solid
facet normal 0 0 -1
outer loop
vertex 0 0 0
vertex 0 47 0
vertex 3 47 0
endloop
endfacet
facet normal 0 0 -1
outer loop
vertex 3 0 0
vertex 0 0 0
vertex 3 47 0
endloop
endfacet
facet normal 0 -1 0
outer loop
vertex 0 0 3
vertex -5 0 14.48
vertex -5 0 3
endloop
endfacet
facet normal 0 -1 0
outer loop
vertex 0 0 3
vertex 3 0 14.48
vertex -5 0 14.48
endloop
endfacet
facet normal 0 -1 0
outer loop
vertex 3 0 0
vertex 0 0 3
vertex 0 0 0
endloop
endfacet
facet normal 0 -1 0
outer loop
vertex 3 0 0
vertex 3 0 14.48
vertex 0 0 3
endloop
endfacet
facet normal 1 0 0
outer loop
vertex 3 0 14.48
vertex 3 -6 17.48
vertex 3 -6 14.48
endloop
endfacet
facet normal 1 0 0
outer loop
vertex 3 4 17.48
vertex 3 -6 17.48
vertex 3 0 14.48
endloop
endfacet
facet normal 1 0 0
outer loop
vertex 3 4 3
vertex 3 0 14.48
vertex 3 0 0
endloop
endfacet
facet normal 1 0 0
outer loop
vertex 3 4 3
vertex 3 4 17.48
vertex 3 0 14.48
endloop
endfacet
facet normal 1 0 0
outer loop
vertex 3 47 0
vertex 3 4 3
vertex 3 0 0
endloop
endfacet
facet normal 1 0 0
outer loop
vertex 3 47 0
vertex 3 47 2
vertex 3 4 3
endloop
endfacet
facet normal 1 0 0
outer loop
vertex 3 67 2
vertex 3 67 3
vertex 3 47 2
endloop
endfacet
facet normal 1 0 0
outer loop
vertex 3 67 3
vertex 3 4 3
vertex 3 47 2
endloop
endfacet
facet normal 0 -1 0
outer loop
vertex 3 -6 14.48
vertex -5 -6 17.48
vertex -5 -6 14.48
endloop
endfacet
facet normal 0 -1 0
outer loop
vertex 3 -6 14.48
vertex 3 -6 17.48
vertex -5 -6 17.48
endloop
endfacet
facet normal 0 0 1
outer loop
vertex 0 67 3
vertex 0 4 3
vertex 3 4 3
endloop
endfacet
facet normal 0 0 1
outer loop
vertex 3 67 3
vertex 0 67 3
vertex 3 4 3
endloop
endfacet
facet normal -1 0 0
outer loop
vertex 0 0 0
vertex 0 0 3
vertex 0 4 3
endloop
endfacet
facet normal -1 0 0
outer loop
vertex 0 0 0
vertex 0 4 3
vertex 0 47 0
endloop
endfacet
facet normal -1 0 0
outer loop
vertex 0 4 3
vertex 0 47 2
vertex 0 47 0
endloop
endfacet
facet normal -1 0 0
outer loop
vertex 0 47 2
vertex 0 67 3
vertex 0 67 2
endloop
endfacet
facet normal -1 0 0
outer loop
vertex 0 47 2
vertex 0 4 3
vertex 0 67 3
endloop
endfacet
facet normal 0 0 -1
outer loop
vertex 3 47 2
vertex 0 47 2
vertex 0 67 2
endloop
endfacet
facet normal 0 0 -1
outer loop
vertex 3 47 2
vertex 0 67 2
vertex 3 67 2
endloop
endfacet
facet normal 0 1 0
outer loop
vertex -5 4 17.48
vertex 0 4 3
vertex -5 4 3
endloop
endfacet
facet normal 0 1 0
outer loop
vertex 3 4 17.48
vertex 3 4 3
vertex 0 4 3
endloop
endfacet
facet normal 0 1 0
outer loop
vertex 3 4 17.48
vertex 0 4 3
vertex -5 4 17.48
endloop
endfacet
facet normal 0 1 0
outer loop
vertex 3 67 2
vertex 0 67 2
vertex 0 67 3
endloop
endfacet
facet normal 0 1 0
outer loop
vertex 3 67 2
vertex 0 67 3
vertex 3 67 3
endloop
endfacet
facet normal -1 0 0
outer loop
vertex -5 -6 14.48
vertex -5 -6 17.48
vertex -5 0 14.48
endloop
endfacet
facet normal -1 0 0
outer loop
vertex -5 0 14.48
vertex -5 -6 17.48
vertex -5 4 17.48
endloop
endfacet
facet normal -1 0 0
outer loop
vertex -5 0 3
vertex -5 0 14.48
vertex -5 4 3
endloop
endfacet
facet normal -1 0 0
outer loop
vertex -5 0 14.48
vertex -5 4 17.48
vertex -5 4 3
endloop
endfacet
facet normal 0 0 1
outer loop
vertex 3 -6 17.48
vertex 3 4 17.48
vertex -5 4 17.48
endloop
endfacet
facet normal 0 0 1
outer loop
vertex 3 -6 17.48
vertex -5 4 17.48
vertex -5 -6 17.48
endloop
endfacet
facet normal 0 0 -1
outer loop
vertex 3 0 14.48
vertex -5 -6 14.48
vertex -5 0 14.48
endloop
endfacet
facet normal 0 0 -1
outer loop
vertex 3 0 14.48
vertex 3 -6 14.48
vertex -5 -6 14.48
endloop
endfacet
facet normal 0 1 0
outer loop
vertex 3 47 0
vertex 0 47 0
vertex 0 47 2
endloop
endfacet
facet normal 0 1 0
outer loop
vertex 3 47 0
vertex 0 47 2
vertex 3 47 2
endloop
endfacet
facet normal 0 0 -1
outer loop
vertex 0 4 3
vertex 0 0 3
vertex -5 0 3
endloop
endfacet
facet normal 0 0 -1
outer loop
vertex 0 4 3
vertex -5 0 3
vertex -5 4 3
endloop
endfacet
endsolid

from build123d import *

# Parameters (mm, degrees)
CROQUIS1_W              = 3
CROQUIS1_H              = 47
SALIENTE_EXTRUIR1_DEPTH = 3
CROQUIS2_W              = 3
CROQUIS2_H              = 1
SALIENTE_EXTRUIR2_DEPTH = 20
CROQUIS3_W              = 3
CROQUIS3_H              = 4
SALIENTE_EXTRUIR3_DEPTH = 11.48
CROQUIS4_W              = 3
CROQUIS4_H              = 3
SALIENTE_EXTRUIR4_DEPTH = 10
SALIENTE_EXTRUIR5_DEPTH = 5


with BuildPart() as part:
    # Croquis1 → Saliente-Extruir1 (new body)
    with BuildSketch(Plane.XY):
        with Locations((1.5, 23.5)):
            Rectangle(CROQUIS1_W, CROQUIS1_H)
    extrude(amount=SALIENTE_EXTRUIR1_DEPTH)

    # Croquis2 → Saliente-Extruir2 (add)
    with BuildSketch(Plane(origin=(0, 47, 0), x_dir=(1, 0, 0), z_dir=(0, 1, 0))):
        with Locations((1.5, -2.5)):
            Rectangle(CROQUIS2_W, CROQUIS2_H)
    extrude(amount=SALIENTE_EXTRUIR2_DEPTH)

    # Croquis3 → Saliente-Extruir3 (add)
    with BuildSketch(Plane.XY.offset(3)):
        with Locations((1.5, 2)):
            Rectangle(CROQUIS3_W, CROQUIS3_H)
    extrude(amount=SALIENTE_EXTRUIR3_DEPTH)

    # Croquis4 → Saliente-Extruir4 (add)
    with BuildSketch(Plane(origin=(0, 4, 0), x_dir=(1, 0, 0), z_dir=(0, 1, 0))):
        with Locations((1.5, -15.98)):
            Rectangle(CROQUIS4_W, CROQUIS4_H)
    extrude(amount=-SALIENTE_EXTRUIR4_DEPTH)

    # Croquis5 → Saliente-Extruir5 (add)
    with BuildSketch(Plane.ZY):
        Polygon((14.48, 0), (3, 0), (3, 4), (17.48, 4), (17.48, -6), (14.48, -6), align=None)
    extrude(amount=SALIENTE_EXTRUIR5_DEPTH)


solid = part.part
